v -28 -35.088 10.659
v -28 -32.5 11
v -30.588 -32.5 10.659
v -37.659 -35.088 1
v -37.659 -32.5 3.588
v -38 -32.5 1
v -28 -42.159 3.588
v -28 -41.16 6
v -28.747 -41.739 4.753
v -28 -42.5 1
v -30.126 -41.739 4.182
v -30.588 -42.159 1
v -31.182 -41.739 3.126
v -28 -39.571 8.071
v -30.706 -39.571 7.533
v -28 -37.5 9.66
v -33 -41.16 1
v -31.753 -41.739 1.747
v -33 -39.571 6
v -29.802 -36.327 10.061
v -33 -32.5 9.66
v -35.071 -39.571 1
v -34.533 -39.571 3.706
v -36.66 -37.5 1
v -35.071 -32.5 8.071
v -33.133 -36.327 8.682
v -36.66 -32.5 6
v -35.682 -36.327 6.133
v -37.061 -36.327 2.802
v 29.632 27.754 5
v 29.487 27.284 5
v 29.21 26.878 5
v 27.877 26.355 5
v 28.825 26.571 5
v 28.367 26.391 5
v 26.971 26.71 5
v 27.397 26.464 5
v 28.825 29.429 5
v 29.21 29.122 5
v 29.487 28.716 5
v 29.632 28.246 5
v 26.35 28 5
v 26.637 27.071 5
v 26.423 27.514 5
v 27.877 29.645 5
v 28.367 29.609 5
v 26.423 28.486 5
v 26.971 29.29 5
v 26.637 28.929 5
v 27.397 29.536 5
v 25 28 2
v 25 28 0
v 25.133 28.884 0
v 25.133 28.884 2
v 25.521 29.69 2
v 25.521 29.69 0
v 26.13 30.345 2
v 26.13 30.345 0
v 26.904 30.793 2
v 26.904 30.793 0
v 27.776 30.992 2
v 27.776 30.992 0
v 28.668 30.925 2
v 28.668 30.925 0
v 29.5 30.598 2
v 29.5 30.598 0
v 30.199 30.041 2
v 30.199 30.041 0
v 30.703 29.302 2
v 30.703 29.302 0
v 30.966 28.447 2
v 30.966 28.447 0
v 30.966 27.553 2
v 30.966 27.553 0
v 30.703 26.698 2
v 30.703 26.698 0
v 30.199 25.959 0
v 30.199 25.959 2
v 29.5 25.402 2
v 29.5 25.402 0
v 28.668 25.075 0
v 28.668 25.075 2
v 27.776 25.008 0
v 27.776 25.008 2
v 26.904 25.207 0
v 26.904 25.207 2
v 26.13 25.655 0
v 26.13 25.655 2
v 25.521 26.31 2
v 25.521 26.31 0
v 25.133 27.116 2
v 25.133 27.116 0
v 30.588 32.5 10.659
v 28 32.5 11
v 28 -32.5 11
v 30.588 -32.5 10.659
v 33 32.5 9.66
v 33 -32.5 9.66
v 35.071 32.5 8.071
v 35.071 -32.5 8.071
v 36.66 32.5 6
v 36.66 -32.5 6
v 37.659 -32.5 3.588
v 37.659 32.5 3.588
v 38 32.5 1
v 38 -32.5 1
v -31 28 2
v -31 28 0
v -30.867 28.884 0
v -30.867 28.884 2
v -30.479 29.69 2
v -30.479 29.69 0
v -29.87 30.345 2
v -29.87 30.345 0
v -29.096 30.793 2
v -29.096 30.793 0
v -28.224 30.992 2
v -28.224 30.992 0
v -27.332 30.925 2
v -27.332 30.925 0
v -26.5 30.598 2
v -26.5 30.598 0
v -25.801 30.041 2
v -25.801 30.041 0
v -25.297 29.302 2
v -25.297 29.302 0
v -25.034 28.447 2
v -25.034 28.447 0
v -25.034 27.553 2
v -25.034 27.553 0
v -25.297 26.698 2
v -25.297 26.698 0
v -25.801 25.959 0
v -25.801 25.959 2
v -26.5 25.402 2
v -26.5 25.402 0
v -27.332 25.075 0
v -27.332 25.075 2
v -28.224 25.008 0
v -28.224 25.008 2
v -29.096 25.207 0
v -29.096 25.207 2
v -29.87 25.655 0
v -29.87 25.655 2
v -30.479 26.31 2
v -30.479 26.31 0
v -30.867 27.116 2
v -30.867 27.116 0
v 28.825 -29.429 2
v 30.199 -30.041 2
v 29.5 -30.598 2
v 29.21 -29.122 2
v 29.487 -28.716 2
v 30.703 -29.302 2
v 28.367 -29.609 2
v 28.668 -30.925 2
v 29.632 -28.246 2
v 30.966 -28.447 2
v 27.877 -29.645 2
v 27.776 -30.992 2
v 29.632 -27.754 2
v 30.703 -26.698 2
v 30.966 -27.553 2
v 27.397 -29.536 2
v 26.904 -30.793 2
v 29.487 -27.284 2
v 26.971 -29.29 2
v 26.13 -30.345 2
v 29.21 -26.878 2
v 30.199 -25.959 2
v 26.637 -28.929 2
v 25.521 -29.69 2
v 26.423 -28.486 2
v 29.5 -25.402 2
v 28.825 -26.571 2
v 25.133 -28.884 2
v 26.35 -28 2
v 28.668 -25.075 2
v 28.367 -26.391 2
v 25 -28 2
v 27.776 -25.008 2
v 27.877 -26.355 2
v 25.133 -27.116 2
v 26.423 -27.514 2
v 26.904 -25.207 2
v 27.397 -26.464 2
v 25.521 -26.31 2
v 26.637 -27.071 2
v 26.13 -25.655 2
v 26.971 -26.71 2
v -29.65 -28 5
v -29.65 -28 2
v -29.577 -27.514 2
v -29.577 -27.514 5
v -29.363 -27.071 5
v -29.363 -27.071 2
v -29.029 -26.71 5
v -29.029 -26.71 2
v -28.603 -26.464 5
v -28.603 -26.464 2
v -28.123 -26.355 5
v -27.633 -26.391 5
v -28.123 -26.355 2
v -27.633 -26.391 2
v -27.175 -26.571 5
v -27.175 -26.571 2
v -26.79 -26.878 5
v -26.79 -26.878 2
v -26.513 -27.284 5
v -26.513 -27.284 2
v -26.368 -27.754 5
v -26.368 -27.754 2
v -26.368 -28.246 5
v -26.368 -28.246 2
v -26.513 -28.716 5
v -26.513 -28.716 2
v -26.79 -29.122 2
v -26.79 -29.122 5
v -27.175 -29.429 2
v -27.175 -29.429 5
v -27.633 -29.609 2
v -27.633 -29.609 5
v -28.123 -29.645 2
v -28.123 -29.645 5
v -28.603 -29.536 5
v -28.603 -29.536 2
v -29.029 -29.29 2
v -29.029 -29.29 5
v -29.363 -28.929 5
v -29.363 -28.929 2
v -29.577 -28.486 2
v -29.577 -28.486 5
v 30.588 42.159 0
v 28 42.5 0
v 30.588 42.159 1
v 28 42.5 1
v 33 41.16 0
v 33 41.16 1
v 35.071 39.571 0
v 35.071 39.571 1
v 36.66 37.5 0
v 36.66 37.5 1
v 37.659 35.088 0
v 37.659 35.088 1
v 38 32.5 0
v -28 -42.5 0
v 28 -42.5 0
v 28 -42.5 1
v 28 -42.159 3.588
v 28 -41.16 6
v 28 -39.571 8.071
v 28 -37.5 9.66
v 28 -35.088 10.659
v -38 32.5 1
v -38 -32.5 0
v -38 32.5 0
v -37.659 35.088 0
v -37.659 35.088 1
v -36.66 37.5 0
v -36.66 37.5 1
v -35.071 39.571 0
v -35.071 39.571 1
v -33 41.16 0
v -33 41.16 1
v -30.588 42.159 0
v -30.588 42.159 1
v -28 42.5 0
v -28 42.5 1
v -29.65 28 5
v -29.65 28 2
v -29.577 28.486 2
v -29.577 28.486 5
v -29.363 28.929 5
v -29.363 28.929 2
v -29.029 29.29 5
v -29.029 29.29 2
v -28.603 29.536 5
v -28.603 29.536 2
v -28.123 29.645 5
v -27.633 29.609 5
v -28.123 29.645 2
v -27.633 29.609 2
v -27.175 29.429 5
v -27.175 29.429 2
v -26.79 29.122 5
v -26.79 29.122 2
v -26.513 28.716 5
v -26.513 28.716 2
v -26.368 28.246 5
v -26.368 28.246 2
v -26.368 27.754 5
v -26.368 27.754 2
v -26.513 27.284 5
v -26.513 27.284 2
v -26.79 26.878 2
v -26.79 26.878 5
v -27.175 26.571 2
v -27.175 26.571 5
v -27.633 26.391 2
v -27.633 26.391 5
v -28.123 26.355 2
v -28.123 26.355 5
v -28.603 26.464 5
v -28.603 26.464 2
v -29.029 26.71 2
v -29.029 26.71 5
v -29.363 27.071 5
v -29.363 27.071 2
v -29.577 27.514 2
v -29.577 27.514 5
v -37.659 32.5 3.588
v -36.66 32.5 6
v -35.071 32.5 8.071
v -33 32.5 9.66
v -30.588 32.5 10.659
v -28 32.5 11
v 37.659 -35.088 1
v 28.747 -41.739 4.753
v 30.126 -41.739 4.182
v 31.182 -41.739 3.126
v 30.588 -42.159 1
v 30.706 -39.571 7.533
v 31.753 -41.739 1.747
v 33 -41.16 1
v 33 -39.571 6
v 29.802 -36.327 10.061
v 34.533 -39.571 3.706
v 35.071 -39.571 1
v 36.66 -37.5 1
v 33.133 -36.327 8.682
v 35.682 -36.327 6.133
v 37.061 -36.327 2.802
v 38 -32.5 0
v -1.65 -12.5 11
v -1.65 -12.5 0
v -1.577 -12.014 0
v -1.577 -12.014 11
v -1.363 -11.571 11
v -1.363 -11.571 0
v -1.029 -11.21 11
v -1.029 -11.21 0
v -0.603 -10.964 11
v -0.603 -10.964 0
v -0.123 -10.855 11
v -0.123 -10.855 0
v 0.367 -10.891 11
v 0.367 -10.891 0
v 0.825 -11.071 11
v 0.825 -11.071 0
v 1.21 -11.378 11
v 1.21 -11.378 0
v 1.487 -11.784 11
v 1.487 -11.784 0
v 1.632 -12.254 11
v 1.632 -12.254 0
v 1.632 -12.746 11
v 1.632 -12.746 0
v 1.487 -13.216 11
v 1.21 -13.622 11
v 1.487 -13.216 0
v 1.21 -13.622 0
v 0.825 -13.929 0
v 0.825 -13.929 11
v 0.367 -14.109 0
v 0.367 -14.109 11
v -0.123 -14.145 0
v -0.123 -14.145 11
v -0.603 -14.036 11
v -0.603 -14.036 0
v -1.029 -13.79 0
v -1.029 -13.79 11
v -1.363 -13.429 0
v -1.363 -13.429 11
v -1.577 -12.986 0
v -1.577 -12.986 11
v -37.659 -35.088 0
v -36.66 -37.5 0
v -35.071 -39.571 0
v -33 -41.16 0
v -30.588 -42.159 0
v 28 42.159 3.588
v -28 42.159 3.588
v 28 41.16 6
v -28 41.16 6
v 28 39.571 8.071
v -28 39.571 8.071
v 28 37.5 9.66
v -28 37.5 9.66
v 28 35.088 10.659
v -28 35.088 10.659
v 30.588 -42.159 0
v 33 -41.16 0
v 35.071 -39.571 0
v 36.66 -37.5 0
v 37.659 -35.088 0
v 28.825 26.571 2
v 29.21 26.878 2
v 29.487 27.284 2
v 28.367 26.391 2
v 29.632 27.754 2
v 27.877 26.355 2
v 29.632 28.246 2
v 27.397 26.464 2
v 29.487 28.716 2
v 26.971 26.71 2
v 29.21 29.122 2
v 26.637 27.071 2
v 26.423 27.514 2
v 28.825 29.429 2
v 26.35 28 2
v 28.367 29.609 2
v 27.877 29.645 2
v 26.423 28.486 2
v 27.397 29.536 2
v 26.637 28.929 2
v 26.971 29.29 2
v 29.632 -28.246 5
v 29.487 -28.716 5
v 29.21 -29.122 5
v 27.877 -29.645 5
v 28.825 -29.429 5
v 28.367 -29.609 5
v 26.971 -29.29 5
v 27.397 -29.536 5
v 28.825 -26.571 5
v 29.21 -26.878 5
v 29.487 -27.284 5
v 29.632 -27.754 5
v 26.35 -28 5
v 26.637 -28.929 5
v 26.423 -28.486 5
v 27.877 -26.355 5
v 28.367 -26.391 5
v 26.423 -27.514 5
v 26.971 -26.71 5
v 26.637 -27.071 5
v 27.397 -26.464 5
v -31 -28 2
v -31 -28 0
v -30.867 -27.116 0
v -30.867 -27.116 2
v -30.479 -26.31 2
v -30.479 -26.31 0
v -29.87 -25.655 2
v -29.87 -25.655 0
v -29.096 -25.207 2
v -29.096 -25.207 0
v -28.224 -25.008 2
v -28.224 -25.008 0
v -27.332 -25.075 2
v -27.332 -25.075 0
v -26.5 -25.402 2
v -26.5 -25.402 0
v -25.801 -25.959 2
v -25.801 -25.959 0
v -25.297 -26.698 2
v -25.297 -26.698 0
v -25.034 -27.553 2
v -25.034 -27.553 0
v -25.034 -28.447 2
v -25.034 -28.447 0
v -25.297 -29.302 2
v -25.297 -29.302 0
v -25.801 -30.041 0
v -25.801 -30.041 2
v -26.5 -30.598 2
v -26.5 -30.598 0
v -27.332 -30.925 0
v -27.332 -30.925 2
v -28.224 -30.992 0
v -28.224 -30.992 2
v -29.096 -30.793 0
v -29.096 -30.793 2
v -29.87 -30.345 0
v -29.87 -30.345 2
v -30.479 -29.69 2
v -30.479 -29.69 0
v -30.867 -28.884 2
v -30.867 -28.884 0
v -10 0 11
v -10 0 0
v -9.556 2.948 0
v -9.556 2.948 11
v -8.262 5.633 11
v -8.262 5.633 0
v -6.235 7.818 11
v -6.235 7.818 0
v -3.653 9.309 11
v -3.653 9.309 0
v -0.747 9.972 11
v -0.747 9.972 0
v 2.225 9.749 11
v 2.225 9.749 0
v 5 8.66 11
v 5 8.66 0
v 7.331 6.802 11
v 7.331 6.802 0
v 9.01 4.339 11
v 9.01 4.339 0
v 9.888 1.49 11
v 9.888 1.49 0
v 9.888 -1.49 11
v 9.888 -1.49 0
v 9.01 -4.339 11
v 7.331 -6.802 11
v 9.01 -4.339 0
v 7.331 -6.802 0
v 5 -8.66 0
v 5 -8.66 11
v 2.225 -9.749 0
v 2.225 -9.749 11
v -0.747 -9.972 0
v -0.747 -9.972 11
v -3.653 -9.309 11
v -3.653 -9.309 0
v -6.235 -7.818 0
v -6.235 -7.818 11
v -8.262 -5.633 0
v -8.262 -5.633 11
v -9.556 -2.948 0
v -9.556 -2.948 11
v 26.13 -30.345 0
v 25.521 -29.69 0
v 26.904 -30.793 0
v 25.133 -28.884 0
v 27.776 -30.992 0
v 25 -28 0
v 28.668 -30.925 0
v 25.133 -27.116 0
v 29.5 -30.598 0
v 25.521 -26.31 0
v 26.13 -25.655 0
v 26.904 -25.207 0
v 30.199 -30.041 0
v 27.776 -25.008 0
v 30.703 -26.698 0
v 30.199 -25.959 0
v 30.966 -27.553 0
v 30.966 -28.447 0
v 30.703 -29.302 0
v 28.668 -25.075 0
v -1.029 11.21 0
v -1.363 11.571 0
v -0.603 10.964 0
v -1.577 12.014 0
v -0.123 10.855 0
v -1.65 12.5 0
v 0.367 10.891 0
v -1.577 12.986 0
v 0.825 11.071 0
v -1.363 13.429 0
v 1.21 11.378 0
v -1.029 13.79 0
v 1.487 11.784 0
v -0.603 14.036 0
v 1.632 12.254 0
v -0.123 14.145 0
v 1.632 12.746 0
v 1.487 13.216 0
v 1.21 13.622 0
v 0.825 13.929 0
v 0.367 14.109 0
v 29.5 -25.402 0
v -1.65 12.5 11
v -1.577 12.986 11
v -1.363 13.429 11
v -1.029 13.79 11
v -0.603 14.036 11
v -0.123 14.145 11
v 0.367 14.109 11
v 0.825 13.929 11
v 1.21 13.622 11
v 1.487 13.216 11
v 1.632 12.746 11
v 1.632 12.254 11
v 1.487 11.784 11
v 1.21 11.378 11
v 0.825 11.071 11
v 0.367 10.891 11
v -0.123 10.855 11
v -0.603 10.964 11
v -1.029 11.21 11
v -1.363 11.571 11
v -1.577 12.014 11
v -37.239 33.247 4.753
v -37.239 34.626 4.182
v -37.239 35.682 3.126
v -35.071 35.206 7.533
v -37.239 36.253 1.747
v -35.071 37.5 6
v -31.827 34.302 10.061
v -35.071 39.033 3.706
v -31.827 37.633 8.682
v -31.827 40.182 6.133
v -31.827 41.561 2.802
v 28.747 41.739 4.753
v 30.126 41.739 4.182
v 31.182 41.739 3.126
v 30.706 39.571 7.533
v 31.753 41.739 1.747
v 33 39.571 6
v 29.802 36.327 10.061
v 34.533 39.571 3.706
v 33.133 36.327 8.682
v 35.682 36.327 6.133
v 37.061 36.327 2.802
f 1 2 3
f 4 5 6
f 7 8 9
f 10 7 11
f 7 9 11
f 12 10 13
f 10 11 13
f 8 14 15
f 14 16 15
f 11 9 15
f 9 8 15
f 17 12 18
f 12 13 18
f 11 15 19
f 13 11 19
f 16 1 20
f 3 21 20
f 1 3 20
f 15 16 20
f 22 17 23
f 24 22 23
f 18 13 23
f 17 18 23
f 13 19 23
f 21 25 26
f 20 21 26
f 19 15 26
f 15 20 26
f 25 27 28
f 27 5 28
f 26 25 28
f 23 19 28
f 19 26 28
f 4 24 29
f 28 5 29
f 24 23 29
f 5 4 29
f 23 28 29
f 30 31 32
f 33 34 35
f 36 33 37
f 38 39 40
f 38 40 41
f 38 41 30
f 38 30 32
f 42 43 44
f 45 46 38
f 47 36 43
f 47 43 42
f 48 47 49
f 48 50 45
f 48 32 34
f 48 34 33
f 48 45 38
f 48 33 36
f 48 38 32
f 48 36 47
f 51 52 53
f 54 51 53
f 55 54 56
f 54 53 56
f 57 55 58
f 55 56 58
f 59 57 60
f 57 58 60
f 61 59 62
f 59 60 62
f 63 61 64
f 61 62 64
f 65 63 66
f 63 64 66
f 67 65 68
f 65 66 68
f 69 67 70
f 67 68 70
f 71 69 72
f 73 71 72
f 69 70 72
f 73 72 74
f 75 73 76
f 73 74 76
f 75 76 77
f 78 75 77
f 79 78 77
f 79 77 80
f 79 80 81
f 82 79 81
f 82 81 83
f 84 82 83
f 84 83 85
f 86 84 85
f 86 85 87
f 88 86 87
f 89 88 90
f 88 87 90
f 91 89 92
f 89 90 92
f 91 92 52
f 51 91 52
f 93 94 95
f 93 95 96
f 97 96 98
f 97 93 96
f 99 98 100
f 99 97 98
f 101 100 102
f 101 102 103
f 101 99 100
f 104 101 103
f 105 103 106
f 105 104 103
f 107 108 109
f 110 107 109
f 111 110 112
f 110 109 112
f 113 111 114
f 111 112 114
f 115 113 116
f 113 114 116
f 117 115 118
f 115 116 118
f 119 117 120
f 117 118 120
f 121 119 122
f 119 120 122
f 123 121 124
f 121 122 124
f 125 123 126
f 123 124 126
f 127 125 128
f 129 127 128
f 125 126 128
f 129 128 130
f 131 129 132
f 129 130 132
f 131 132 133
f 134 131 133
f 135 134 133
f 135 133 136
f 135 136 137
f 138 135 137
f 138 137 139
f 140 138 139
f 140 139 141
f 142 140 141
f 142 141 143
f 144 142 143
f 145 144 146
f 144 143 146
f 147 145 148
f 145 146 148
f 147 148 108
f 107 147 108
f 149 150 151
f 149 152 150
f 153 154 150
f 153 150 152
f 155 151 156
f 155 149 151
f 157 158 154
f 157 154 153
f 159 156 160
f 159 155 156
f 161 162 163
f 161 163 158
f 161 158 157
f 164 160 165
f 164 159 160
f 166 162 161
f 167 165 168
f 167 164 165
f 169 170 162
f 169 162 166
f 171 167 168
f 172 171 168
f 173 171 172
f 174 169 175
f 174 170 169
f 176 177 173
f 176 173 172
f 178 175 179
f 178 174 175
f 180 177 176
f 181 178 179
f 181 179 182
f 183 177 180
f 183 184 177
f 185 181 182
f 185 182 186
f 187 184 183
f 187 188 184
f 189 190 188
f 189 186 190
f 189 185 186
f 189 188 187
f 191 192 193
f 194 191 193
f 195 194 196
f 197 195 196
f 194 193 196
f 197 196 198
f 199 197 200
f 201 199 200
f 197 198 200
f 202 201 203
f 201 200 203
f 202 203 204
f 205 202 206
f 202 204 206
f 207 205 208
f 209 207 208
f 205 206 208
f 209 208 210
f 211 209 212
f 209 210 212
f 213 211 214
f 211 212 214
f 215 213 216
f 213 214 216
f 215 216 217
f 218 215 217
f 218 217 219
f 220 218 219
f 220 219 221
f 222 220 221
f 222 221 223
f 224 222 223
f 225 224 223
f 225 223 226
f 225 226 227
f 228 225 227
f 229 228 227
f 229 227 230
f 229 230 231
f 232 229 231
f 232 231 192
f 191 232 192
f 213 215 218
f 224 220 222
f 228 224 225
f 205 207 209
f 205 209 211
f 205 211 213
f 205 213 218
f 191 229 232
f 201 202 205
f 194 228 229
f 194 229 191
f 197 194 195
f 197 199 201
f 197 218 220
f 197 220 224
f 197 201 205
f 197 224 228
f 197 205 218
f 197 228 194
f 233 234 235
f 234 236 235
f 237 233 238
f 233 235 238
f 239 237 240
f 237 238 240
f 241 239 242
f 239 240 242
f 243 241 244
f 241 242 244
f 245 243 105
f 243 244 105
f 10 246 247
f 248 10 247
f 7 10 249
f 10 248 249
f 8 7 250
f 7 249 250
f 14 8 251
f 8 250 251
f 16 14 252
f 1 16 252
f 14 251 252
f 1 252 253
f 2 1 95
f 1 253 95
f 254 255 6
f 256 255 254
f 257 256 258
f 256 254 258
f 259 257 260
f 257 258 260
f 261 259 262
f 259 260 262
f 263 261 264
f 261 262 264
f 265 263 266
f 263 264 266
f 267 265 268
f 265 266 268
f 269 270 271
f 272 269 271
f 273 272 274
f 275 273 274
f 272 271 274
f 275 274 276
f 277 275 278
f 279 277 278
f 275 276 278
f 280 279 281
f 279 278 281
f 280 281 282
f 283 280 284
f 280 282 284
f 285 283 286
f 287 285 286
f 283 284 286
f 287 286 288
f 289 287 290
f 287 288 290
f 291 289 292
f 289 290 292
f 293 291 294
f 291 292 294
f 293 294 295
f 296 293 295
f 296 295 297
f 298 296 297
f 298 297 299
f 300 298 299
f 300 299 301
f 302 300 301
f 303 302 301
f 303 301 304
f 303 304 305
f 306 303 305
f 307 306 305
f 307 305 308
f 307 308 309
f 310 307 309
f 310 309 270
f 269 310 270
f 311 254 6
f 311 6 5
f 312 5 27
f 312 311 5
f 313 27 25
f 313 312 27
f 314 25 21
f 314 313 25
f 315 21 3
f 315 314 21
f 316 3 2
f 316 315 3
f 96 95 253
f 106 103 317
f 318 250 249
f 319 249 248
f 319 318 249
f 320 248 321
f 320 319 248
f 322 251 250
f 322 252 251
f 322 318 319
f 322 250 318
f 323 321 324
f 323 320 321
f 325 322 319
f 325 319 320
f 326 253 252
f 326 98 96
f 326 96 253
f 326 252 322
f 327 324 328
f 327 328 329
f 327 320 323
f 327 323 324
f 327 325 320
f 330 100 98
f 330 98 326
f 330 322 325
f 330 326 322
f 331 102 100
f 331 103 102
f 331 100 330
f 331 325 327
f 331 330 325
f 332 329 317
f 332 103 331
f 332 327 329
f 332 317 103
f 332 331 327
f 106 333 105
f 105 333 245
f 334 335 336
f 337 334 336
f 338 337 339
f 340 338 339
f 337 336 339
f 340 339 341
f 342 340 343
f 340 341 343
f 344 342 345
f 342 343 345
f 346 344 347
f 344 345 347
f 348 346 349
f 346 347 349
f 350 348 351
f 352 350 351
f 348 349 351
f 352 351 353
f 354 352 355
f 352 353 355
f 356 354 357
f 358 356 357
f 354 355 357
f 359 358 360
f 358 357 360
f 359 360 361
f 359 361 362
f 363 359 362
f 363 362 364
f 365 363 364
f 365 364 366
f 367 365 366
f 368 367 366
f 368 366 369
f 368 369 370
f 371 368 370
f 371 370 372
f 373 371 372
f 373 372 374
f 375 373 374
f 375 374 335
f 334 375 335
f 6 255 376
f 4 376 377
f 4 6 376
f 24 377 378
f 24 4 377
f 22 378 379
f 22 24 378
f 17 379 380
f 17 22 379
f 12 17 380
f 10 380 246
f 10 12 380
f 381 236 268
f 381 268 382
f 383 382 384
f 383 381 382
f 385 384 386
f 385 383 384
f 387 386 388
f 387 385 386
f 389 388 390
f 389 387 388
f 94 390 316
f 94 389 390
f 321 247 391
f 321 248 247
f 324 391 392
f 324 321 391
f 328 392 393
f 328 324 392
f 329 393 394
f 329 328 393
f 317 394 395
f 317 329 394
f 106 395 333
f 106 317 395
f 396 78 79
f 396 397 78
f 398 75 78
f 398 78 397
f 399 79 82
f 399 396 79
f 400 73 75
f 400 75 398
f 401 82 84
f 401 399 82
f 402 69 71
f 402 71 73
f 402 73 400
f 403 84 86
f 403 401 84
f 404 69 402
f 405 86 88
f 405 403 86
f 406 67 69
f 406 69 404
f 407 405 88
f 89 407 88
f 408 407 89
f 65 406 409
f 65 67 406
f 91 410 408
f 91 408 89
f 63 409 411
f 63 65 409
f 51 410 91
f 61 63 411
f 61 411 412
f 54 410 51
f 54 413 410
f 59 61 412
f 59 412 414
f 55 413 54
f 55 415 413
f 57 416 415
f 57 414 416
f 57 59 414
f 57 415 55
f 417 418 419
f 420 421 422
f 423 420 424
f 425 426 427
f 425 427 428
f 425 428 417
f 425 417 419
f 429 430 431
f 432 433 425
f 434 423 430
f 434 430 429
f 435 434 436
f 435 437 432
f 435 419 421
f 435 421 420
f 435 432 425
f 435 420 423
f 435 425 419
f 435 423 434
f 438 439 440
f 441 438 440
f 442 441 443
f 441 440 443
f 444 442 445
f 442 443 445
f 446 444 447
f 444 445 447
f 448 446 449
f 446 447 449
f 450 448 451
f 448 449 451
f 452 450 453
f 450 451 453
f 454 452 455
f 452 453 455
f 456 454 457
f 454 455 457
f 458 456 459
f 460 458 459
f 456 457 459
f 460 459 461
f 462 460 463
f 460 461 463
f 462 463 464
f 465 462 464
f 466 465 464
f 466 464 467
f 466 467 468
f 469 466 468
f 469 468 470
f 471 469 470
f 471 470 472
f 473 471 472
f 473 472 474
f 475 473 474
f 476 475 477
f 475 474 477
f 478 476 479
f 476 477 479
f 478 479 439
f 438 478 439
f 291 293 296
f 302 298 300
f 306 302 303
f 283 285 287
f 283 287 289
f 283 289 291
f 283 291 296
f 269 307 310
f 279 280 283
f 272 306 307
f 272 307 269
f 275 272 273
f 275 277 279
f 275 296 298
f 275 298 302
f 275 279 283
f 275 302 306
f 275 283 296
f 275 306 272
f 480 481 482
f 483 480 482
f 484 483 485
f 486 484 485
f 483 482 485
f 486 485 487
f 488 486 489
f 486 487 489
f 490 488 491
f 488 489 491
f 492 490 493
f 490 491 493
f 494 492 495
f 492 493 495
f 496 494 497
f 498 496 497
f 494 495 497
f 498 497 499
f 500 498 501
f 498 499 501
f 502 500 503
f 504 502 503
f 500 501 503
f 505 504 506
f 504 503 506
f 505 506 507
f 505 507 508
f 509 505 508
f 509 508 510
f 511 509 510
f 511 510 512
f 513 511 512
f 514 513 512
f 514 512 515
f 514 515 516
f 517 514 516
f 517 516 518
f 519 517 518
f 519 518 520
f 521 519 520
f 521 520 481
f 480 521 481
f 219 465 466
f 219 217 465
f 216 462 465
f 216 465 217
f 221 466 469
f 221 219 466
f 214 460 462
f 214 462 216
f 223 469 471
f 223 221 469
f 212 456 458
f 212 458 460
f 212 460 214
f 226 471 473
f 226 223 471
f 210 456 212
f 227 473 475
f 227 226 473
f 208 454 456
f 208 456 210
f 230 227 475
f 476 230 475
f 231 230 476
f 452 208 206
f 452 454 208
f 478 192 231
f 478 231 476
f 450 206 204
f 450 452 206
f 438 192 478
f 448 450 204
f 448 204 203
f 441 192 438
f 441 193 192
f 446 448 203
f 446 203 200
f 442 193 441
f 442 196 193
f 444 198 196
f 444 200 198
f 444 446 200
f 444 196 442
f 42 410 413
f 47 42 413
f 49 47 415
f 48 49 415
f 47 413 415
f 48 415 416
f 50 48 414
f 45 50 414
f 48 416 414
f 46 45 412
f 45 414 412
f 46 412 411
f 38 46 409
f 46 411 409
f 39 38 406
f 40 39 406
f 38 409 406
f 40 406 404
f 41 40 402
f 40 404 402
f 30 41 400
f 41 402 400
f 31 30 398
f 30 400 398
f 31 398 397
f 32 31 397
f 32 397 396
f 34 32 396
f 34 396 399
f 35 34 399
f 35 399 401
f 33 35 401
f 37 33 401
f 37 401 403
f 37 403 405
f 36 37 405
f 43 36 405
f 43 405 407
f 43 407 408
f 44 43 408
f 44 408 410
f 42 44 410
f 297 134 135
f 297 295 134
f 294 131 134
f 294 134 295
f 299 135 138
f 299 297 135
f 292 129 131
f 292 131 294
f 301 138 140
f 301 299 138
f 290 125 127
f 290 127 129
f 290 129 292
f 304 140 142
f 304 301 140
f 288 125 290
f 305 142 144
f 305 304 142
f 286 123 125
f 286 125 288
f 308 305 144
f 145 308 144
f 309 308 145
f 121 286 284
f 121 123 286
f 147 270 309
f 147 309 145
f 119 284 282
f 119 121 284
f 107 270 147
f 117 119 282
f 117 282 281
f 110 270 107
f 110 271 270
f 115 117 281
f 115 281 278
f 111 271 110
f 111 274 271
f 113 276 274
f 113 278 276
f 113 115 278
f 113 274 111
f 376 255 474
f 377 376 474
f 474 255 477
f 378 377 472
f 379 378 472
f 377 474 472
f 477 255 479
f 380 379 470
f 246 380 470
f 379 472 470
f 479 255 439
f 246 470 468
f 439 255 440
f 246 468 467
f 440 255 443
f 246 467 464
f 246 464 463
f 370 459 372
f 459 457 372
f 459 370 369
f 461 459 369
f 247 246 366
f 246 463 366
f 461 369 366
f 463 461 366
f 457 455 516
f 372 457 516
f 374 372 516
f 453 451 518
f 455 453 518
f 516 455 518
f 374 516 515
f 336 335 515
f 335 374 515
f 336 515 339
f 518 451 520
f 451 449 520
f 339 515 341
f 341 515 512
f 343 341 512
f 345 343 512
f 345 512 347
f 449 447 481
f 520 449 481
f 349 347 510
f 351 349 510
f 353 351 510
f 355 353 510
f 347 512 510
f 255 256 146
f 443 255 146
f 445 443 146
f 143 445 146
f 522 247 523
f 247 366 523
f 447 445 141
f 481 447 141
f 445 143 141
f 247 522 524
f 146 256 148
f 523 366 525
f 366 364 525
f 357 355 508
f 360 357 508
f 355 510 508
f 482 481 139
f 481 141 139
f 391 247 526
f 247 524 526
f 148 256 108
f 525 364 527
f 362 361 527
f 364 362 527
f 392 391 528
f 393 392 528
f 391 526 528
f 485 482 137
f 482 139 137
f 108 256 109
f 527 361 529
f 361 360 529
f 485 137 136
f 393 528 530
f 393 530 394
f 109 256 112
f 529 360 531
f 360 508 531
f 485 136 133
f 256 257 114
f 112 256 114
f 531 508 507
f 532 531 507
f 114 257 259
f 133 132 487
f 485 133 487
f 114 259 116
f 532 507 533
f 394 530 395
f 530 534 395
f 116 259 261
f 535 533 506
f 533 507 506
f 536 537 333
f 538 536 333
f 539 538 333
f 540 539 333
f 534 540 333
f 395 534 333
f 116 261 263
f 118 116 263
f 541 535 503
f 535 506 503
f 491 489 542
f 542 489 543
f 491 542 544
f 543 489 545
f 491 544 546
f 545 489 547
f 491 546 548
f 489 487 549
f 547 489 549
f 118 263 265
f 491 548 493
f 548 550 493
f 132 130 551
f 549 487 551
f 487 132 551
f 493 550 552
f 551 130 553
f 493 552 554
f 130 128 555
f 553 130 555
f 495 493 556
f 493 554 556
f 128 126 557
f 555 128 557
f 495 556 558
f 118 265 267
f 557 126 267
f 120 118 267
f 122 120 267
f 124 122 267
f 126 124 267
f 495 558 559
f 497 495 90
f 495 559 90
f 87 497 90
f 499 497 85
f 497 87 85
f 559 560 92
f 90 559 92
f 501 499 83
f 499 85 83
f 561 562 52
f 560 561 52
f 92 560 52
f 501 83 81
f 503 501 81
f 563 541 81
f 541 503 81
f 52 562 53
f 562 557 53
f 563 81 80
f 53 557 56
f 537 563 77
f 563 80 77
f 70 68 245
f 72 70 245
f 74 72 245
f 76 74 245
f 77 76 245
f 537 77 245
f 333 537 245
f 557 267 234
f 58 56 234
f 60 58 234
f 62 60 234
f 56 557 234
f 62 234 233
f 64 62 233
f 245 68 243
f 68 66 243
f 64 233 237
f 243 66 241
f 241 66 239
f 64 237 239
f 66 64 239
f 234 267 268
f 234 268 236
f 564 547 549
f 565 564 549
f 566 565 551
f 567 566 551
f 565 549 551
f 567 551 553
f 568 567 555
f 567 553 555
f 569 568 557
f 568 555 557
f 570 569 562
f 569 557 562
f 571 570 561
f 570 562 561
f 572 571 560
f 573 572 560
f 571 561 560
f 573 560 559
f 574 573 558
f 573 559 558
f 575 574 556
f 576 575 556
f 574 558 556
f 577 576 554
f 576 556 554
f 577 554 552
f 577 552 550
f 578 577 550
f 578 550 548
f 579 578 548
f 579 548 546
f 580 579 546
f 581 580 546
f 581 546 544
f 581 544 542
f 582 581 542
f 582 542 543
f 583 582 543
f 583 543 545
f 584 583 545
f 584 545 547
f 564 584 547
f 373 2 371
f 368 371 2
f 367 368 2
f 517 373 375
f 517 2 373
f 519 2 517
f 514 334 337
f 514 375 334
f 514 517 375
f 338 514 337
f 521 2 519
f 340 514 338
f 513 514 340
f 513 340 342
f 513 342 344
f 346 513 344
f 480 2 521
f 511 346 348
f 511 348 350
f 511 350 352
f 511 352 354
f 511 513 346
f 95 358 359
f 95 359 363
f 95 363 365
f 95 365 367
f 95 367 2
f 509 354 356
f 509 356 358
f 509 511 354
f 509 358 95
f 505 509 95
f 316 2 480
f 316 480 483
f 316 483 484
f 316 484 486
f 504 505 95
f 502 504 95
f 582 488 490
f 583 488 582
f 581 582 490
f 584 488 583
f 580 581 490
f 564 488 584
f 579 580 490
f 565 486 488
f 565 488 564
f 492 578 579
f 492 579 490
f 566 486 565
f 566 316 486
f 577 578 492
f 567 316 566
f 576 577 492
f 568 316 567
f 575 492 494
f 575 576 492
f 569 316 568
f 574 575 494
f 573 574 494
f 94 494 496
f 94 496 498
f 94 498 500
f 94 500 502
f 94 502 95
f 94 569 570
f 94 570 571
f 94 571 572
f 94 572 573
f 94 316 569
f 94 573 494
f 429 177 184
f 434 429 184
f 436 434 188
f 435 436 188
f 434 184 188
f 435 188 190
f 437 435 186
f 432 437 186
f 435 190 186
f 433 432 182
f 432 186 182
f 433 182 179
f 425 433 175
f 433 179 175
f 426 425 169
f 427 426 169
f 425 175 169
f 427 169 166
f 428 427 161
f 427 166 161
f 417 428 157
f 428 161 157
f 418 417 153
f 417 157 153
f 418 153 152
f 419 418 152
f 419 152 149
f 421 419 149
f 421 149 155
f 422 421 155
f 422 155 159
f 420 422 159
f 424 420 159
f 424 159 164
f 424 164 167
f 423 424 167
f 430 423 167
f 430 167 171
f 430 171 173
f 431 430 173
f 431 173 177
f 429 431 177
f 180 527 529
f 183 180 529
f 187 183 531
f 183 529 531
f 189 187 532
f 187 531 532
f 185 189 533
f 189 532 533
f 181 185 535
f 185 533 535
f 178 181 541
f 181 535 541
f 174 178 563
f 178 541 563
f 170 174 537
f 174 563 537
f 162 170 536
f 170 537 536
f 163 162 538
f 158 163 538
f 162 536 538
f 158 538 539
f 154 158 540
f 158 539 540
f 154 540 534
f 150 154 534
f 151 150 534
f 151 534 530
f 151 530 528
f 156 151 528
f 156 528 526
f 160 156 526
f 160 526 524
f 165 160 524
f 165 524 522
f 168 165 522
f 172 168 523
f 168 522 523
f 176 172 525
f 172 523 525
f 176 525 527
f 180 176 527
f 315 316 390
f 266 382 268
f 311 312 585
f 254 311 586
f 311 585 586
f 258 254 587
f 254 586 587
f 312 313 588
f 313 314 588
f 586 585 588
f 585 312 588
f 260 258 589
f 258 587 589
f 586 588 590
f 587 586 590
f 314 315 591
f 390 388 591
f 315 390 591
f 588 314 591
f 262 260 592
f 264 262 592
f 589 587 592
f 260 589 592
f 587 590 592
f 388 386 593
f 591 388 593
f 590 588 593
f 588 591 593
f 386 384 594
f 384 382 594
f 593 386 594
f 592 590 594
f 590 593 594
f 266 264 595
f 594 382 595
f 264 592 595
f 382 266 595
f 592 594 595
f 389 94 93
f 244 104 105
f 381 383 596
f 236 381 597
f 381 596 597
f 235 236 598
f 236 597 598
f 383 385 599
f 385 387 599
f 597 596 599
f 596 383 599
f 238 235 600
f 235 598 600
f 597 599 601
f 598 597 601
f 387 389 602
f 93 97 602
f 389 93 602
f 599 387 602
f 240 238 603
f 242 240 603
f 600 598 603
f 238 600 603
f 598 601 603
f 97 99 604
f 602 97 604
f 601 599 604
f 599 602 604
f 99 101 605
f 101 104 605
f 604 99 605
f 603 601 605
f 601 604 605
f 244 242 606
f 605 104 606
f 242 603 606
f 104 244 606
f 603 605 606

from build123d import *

# Parameters (mm, degrees)
CROQUIS1_W              = 76
CROQUIS1_H              = 85
SALIENTE_EXTRUIR1_DEPTH = 11
CROQUIS3_R              = 1.65
CORTAR_EXTRUIR2_DEPTH   = 5
CROQUIS4_R              = 3
CORTAR_EXTRUIR3_DEPTH   = 2
REDONDEO3_R             = 10
CROQUIS5_R              = 10
CROQUIS5_R_2            = 1.65
CORTAR_EXTRUIR4_DEPTH   = 12


with BuildPart() as part:
    # Croquis1 → Saliente-Extruir1 (new body)
    with BuildSketch(Plane.XY):
        Rectangle(CROQUIS1_W, CROQUIS1_H)
    extrude(amount=SALIENTE_EXTRUIR1_DEPTH)

    # Croquis3 → Cortar-Extruir2 (cut)
    with BuildSketch(Plane(origin=(0, 0, 0), x_dir=(-1, 0, 0), z_dir=(0, 0, -1))):
        with Locations((28, -28)):
            Circle(CROQUIS3_R)
        with Locations((-28, -28)):
            Circle(CROQUIS3_R)
        with Locations((-28, 28)):
            Circle(CROQUIS3_R)
        with Locations((28, 28)):
            Circle(CROQUIS3_R)
    extrude(amount=-CORTAR_EXTRUIR2_DEPTH, mode=Mode.SUBTRACT)

    # Croquis4 → Cortar-Extruir3 (cut)
    with BuildSketch(Plane(origin=(0, 0, 0), x_dir=(-1, 0, 0), z_dir=(0, 0, -1))):
        with Locations((28, 28)):
            Circle(CROQUIS4_R)
        with Locations((28, -28)):
            Circle(CROQUIS4_R)
        with Locations((-28, 28)):
            Circle(CROQUIS4_R)
        with Locations((-28, -28)):
            Circle(CROQUIS4_R)
    extrude(amount=-CORTAR_EXTRUIR3_DEPTH, mode=Mode.SUBTRACT)

    # Redondeo3
    redondeo3_edges = [part.edges().sort_by_distance(p)[0] for p in [
        (38, 0, 11),
        (0, 42.5, 11),
        (-38, 0, 11),
        (0, -42.5, 11),
        (-38, 42.5, 5.5),
        (38, 42.5, 5.5),
        (38, -42.5, 5.5),
        (-38, -42.5, 5.5),
    ]]
    fillet(redondeo3_edges, radius=REDONDEO3_R)

    # Croquis5 → Cortar-Extruir4 (cut, through all)
    with BuildSketch(Plane(origin=(0, 0, 0), x_dir=(-1, 0, 0), z_dir=(0, 0, -1))):
        Circle(CROQUIS5_R)
        with Locations((0, 12.5)):
            Circle(CROQUIS5_R_2)
        with Locations((0, -12.5)):
            Circle(CROQUIS5_R_2)
    extrude(amount=-CORTAR_EXTRUIR4_DEPTH, mode=Mode.SUBTRACT)


solid = part.part
